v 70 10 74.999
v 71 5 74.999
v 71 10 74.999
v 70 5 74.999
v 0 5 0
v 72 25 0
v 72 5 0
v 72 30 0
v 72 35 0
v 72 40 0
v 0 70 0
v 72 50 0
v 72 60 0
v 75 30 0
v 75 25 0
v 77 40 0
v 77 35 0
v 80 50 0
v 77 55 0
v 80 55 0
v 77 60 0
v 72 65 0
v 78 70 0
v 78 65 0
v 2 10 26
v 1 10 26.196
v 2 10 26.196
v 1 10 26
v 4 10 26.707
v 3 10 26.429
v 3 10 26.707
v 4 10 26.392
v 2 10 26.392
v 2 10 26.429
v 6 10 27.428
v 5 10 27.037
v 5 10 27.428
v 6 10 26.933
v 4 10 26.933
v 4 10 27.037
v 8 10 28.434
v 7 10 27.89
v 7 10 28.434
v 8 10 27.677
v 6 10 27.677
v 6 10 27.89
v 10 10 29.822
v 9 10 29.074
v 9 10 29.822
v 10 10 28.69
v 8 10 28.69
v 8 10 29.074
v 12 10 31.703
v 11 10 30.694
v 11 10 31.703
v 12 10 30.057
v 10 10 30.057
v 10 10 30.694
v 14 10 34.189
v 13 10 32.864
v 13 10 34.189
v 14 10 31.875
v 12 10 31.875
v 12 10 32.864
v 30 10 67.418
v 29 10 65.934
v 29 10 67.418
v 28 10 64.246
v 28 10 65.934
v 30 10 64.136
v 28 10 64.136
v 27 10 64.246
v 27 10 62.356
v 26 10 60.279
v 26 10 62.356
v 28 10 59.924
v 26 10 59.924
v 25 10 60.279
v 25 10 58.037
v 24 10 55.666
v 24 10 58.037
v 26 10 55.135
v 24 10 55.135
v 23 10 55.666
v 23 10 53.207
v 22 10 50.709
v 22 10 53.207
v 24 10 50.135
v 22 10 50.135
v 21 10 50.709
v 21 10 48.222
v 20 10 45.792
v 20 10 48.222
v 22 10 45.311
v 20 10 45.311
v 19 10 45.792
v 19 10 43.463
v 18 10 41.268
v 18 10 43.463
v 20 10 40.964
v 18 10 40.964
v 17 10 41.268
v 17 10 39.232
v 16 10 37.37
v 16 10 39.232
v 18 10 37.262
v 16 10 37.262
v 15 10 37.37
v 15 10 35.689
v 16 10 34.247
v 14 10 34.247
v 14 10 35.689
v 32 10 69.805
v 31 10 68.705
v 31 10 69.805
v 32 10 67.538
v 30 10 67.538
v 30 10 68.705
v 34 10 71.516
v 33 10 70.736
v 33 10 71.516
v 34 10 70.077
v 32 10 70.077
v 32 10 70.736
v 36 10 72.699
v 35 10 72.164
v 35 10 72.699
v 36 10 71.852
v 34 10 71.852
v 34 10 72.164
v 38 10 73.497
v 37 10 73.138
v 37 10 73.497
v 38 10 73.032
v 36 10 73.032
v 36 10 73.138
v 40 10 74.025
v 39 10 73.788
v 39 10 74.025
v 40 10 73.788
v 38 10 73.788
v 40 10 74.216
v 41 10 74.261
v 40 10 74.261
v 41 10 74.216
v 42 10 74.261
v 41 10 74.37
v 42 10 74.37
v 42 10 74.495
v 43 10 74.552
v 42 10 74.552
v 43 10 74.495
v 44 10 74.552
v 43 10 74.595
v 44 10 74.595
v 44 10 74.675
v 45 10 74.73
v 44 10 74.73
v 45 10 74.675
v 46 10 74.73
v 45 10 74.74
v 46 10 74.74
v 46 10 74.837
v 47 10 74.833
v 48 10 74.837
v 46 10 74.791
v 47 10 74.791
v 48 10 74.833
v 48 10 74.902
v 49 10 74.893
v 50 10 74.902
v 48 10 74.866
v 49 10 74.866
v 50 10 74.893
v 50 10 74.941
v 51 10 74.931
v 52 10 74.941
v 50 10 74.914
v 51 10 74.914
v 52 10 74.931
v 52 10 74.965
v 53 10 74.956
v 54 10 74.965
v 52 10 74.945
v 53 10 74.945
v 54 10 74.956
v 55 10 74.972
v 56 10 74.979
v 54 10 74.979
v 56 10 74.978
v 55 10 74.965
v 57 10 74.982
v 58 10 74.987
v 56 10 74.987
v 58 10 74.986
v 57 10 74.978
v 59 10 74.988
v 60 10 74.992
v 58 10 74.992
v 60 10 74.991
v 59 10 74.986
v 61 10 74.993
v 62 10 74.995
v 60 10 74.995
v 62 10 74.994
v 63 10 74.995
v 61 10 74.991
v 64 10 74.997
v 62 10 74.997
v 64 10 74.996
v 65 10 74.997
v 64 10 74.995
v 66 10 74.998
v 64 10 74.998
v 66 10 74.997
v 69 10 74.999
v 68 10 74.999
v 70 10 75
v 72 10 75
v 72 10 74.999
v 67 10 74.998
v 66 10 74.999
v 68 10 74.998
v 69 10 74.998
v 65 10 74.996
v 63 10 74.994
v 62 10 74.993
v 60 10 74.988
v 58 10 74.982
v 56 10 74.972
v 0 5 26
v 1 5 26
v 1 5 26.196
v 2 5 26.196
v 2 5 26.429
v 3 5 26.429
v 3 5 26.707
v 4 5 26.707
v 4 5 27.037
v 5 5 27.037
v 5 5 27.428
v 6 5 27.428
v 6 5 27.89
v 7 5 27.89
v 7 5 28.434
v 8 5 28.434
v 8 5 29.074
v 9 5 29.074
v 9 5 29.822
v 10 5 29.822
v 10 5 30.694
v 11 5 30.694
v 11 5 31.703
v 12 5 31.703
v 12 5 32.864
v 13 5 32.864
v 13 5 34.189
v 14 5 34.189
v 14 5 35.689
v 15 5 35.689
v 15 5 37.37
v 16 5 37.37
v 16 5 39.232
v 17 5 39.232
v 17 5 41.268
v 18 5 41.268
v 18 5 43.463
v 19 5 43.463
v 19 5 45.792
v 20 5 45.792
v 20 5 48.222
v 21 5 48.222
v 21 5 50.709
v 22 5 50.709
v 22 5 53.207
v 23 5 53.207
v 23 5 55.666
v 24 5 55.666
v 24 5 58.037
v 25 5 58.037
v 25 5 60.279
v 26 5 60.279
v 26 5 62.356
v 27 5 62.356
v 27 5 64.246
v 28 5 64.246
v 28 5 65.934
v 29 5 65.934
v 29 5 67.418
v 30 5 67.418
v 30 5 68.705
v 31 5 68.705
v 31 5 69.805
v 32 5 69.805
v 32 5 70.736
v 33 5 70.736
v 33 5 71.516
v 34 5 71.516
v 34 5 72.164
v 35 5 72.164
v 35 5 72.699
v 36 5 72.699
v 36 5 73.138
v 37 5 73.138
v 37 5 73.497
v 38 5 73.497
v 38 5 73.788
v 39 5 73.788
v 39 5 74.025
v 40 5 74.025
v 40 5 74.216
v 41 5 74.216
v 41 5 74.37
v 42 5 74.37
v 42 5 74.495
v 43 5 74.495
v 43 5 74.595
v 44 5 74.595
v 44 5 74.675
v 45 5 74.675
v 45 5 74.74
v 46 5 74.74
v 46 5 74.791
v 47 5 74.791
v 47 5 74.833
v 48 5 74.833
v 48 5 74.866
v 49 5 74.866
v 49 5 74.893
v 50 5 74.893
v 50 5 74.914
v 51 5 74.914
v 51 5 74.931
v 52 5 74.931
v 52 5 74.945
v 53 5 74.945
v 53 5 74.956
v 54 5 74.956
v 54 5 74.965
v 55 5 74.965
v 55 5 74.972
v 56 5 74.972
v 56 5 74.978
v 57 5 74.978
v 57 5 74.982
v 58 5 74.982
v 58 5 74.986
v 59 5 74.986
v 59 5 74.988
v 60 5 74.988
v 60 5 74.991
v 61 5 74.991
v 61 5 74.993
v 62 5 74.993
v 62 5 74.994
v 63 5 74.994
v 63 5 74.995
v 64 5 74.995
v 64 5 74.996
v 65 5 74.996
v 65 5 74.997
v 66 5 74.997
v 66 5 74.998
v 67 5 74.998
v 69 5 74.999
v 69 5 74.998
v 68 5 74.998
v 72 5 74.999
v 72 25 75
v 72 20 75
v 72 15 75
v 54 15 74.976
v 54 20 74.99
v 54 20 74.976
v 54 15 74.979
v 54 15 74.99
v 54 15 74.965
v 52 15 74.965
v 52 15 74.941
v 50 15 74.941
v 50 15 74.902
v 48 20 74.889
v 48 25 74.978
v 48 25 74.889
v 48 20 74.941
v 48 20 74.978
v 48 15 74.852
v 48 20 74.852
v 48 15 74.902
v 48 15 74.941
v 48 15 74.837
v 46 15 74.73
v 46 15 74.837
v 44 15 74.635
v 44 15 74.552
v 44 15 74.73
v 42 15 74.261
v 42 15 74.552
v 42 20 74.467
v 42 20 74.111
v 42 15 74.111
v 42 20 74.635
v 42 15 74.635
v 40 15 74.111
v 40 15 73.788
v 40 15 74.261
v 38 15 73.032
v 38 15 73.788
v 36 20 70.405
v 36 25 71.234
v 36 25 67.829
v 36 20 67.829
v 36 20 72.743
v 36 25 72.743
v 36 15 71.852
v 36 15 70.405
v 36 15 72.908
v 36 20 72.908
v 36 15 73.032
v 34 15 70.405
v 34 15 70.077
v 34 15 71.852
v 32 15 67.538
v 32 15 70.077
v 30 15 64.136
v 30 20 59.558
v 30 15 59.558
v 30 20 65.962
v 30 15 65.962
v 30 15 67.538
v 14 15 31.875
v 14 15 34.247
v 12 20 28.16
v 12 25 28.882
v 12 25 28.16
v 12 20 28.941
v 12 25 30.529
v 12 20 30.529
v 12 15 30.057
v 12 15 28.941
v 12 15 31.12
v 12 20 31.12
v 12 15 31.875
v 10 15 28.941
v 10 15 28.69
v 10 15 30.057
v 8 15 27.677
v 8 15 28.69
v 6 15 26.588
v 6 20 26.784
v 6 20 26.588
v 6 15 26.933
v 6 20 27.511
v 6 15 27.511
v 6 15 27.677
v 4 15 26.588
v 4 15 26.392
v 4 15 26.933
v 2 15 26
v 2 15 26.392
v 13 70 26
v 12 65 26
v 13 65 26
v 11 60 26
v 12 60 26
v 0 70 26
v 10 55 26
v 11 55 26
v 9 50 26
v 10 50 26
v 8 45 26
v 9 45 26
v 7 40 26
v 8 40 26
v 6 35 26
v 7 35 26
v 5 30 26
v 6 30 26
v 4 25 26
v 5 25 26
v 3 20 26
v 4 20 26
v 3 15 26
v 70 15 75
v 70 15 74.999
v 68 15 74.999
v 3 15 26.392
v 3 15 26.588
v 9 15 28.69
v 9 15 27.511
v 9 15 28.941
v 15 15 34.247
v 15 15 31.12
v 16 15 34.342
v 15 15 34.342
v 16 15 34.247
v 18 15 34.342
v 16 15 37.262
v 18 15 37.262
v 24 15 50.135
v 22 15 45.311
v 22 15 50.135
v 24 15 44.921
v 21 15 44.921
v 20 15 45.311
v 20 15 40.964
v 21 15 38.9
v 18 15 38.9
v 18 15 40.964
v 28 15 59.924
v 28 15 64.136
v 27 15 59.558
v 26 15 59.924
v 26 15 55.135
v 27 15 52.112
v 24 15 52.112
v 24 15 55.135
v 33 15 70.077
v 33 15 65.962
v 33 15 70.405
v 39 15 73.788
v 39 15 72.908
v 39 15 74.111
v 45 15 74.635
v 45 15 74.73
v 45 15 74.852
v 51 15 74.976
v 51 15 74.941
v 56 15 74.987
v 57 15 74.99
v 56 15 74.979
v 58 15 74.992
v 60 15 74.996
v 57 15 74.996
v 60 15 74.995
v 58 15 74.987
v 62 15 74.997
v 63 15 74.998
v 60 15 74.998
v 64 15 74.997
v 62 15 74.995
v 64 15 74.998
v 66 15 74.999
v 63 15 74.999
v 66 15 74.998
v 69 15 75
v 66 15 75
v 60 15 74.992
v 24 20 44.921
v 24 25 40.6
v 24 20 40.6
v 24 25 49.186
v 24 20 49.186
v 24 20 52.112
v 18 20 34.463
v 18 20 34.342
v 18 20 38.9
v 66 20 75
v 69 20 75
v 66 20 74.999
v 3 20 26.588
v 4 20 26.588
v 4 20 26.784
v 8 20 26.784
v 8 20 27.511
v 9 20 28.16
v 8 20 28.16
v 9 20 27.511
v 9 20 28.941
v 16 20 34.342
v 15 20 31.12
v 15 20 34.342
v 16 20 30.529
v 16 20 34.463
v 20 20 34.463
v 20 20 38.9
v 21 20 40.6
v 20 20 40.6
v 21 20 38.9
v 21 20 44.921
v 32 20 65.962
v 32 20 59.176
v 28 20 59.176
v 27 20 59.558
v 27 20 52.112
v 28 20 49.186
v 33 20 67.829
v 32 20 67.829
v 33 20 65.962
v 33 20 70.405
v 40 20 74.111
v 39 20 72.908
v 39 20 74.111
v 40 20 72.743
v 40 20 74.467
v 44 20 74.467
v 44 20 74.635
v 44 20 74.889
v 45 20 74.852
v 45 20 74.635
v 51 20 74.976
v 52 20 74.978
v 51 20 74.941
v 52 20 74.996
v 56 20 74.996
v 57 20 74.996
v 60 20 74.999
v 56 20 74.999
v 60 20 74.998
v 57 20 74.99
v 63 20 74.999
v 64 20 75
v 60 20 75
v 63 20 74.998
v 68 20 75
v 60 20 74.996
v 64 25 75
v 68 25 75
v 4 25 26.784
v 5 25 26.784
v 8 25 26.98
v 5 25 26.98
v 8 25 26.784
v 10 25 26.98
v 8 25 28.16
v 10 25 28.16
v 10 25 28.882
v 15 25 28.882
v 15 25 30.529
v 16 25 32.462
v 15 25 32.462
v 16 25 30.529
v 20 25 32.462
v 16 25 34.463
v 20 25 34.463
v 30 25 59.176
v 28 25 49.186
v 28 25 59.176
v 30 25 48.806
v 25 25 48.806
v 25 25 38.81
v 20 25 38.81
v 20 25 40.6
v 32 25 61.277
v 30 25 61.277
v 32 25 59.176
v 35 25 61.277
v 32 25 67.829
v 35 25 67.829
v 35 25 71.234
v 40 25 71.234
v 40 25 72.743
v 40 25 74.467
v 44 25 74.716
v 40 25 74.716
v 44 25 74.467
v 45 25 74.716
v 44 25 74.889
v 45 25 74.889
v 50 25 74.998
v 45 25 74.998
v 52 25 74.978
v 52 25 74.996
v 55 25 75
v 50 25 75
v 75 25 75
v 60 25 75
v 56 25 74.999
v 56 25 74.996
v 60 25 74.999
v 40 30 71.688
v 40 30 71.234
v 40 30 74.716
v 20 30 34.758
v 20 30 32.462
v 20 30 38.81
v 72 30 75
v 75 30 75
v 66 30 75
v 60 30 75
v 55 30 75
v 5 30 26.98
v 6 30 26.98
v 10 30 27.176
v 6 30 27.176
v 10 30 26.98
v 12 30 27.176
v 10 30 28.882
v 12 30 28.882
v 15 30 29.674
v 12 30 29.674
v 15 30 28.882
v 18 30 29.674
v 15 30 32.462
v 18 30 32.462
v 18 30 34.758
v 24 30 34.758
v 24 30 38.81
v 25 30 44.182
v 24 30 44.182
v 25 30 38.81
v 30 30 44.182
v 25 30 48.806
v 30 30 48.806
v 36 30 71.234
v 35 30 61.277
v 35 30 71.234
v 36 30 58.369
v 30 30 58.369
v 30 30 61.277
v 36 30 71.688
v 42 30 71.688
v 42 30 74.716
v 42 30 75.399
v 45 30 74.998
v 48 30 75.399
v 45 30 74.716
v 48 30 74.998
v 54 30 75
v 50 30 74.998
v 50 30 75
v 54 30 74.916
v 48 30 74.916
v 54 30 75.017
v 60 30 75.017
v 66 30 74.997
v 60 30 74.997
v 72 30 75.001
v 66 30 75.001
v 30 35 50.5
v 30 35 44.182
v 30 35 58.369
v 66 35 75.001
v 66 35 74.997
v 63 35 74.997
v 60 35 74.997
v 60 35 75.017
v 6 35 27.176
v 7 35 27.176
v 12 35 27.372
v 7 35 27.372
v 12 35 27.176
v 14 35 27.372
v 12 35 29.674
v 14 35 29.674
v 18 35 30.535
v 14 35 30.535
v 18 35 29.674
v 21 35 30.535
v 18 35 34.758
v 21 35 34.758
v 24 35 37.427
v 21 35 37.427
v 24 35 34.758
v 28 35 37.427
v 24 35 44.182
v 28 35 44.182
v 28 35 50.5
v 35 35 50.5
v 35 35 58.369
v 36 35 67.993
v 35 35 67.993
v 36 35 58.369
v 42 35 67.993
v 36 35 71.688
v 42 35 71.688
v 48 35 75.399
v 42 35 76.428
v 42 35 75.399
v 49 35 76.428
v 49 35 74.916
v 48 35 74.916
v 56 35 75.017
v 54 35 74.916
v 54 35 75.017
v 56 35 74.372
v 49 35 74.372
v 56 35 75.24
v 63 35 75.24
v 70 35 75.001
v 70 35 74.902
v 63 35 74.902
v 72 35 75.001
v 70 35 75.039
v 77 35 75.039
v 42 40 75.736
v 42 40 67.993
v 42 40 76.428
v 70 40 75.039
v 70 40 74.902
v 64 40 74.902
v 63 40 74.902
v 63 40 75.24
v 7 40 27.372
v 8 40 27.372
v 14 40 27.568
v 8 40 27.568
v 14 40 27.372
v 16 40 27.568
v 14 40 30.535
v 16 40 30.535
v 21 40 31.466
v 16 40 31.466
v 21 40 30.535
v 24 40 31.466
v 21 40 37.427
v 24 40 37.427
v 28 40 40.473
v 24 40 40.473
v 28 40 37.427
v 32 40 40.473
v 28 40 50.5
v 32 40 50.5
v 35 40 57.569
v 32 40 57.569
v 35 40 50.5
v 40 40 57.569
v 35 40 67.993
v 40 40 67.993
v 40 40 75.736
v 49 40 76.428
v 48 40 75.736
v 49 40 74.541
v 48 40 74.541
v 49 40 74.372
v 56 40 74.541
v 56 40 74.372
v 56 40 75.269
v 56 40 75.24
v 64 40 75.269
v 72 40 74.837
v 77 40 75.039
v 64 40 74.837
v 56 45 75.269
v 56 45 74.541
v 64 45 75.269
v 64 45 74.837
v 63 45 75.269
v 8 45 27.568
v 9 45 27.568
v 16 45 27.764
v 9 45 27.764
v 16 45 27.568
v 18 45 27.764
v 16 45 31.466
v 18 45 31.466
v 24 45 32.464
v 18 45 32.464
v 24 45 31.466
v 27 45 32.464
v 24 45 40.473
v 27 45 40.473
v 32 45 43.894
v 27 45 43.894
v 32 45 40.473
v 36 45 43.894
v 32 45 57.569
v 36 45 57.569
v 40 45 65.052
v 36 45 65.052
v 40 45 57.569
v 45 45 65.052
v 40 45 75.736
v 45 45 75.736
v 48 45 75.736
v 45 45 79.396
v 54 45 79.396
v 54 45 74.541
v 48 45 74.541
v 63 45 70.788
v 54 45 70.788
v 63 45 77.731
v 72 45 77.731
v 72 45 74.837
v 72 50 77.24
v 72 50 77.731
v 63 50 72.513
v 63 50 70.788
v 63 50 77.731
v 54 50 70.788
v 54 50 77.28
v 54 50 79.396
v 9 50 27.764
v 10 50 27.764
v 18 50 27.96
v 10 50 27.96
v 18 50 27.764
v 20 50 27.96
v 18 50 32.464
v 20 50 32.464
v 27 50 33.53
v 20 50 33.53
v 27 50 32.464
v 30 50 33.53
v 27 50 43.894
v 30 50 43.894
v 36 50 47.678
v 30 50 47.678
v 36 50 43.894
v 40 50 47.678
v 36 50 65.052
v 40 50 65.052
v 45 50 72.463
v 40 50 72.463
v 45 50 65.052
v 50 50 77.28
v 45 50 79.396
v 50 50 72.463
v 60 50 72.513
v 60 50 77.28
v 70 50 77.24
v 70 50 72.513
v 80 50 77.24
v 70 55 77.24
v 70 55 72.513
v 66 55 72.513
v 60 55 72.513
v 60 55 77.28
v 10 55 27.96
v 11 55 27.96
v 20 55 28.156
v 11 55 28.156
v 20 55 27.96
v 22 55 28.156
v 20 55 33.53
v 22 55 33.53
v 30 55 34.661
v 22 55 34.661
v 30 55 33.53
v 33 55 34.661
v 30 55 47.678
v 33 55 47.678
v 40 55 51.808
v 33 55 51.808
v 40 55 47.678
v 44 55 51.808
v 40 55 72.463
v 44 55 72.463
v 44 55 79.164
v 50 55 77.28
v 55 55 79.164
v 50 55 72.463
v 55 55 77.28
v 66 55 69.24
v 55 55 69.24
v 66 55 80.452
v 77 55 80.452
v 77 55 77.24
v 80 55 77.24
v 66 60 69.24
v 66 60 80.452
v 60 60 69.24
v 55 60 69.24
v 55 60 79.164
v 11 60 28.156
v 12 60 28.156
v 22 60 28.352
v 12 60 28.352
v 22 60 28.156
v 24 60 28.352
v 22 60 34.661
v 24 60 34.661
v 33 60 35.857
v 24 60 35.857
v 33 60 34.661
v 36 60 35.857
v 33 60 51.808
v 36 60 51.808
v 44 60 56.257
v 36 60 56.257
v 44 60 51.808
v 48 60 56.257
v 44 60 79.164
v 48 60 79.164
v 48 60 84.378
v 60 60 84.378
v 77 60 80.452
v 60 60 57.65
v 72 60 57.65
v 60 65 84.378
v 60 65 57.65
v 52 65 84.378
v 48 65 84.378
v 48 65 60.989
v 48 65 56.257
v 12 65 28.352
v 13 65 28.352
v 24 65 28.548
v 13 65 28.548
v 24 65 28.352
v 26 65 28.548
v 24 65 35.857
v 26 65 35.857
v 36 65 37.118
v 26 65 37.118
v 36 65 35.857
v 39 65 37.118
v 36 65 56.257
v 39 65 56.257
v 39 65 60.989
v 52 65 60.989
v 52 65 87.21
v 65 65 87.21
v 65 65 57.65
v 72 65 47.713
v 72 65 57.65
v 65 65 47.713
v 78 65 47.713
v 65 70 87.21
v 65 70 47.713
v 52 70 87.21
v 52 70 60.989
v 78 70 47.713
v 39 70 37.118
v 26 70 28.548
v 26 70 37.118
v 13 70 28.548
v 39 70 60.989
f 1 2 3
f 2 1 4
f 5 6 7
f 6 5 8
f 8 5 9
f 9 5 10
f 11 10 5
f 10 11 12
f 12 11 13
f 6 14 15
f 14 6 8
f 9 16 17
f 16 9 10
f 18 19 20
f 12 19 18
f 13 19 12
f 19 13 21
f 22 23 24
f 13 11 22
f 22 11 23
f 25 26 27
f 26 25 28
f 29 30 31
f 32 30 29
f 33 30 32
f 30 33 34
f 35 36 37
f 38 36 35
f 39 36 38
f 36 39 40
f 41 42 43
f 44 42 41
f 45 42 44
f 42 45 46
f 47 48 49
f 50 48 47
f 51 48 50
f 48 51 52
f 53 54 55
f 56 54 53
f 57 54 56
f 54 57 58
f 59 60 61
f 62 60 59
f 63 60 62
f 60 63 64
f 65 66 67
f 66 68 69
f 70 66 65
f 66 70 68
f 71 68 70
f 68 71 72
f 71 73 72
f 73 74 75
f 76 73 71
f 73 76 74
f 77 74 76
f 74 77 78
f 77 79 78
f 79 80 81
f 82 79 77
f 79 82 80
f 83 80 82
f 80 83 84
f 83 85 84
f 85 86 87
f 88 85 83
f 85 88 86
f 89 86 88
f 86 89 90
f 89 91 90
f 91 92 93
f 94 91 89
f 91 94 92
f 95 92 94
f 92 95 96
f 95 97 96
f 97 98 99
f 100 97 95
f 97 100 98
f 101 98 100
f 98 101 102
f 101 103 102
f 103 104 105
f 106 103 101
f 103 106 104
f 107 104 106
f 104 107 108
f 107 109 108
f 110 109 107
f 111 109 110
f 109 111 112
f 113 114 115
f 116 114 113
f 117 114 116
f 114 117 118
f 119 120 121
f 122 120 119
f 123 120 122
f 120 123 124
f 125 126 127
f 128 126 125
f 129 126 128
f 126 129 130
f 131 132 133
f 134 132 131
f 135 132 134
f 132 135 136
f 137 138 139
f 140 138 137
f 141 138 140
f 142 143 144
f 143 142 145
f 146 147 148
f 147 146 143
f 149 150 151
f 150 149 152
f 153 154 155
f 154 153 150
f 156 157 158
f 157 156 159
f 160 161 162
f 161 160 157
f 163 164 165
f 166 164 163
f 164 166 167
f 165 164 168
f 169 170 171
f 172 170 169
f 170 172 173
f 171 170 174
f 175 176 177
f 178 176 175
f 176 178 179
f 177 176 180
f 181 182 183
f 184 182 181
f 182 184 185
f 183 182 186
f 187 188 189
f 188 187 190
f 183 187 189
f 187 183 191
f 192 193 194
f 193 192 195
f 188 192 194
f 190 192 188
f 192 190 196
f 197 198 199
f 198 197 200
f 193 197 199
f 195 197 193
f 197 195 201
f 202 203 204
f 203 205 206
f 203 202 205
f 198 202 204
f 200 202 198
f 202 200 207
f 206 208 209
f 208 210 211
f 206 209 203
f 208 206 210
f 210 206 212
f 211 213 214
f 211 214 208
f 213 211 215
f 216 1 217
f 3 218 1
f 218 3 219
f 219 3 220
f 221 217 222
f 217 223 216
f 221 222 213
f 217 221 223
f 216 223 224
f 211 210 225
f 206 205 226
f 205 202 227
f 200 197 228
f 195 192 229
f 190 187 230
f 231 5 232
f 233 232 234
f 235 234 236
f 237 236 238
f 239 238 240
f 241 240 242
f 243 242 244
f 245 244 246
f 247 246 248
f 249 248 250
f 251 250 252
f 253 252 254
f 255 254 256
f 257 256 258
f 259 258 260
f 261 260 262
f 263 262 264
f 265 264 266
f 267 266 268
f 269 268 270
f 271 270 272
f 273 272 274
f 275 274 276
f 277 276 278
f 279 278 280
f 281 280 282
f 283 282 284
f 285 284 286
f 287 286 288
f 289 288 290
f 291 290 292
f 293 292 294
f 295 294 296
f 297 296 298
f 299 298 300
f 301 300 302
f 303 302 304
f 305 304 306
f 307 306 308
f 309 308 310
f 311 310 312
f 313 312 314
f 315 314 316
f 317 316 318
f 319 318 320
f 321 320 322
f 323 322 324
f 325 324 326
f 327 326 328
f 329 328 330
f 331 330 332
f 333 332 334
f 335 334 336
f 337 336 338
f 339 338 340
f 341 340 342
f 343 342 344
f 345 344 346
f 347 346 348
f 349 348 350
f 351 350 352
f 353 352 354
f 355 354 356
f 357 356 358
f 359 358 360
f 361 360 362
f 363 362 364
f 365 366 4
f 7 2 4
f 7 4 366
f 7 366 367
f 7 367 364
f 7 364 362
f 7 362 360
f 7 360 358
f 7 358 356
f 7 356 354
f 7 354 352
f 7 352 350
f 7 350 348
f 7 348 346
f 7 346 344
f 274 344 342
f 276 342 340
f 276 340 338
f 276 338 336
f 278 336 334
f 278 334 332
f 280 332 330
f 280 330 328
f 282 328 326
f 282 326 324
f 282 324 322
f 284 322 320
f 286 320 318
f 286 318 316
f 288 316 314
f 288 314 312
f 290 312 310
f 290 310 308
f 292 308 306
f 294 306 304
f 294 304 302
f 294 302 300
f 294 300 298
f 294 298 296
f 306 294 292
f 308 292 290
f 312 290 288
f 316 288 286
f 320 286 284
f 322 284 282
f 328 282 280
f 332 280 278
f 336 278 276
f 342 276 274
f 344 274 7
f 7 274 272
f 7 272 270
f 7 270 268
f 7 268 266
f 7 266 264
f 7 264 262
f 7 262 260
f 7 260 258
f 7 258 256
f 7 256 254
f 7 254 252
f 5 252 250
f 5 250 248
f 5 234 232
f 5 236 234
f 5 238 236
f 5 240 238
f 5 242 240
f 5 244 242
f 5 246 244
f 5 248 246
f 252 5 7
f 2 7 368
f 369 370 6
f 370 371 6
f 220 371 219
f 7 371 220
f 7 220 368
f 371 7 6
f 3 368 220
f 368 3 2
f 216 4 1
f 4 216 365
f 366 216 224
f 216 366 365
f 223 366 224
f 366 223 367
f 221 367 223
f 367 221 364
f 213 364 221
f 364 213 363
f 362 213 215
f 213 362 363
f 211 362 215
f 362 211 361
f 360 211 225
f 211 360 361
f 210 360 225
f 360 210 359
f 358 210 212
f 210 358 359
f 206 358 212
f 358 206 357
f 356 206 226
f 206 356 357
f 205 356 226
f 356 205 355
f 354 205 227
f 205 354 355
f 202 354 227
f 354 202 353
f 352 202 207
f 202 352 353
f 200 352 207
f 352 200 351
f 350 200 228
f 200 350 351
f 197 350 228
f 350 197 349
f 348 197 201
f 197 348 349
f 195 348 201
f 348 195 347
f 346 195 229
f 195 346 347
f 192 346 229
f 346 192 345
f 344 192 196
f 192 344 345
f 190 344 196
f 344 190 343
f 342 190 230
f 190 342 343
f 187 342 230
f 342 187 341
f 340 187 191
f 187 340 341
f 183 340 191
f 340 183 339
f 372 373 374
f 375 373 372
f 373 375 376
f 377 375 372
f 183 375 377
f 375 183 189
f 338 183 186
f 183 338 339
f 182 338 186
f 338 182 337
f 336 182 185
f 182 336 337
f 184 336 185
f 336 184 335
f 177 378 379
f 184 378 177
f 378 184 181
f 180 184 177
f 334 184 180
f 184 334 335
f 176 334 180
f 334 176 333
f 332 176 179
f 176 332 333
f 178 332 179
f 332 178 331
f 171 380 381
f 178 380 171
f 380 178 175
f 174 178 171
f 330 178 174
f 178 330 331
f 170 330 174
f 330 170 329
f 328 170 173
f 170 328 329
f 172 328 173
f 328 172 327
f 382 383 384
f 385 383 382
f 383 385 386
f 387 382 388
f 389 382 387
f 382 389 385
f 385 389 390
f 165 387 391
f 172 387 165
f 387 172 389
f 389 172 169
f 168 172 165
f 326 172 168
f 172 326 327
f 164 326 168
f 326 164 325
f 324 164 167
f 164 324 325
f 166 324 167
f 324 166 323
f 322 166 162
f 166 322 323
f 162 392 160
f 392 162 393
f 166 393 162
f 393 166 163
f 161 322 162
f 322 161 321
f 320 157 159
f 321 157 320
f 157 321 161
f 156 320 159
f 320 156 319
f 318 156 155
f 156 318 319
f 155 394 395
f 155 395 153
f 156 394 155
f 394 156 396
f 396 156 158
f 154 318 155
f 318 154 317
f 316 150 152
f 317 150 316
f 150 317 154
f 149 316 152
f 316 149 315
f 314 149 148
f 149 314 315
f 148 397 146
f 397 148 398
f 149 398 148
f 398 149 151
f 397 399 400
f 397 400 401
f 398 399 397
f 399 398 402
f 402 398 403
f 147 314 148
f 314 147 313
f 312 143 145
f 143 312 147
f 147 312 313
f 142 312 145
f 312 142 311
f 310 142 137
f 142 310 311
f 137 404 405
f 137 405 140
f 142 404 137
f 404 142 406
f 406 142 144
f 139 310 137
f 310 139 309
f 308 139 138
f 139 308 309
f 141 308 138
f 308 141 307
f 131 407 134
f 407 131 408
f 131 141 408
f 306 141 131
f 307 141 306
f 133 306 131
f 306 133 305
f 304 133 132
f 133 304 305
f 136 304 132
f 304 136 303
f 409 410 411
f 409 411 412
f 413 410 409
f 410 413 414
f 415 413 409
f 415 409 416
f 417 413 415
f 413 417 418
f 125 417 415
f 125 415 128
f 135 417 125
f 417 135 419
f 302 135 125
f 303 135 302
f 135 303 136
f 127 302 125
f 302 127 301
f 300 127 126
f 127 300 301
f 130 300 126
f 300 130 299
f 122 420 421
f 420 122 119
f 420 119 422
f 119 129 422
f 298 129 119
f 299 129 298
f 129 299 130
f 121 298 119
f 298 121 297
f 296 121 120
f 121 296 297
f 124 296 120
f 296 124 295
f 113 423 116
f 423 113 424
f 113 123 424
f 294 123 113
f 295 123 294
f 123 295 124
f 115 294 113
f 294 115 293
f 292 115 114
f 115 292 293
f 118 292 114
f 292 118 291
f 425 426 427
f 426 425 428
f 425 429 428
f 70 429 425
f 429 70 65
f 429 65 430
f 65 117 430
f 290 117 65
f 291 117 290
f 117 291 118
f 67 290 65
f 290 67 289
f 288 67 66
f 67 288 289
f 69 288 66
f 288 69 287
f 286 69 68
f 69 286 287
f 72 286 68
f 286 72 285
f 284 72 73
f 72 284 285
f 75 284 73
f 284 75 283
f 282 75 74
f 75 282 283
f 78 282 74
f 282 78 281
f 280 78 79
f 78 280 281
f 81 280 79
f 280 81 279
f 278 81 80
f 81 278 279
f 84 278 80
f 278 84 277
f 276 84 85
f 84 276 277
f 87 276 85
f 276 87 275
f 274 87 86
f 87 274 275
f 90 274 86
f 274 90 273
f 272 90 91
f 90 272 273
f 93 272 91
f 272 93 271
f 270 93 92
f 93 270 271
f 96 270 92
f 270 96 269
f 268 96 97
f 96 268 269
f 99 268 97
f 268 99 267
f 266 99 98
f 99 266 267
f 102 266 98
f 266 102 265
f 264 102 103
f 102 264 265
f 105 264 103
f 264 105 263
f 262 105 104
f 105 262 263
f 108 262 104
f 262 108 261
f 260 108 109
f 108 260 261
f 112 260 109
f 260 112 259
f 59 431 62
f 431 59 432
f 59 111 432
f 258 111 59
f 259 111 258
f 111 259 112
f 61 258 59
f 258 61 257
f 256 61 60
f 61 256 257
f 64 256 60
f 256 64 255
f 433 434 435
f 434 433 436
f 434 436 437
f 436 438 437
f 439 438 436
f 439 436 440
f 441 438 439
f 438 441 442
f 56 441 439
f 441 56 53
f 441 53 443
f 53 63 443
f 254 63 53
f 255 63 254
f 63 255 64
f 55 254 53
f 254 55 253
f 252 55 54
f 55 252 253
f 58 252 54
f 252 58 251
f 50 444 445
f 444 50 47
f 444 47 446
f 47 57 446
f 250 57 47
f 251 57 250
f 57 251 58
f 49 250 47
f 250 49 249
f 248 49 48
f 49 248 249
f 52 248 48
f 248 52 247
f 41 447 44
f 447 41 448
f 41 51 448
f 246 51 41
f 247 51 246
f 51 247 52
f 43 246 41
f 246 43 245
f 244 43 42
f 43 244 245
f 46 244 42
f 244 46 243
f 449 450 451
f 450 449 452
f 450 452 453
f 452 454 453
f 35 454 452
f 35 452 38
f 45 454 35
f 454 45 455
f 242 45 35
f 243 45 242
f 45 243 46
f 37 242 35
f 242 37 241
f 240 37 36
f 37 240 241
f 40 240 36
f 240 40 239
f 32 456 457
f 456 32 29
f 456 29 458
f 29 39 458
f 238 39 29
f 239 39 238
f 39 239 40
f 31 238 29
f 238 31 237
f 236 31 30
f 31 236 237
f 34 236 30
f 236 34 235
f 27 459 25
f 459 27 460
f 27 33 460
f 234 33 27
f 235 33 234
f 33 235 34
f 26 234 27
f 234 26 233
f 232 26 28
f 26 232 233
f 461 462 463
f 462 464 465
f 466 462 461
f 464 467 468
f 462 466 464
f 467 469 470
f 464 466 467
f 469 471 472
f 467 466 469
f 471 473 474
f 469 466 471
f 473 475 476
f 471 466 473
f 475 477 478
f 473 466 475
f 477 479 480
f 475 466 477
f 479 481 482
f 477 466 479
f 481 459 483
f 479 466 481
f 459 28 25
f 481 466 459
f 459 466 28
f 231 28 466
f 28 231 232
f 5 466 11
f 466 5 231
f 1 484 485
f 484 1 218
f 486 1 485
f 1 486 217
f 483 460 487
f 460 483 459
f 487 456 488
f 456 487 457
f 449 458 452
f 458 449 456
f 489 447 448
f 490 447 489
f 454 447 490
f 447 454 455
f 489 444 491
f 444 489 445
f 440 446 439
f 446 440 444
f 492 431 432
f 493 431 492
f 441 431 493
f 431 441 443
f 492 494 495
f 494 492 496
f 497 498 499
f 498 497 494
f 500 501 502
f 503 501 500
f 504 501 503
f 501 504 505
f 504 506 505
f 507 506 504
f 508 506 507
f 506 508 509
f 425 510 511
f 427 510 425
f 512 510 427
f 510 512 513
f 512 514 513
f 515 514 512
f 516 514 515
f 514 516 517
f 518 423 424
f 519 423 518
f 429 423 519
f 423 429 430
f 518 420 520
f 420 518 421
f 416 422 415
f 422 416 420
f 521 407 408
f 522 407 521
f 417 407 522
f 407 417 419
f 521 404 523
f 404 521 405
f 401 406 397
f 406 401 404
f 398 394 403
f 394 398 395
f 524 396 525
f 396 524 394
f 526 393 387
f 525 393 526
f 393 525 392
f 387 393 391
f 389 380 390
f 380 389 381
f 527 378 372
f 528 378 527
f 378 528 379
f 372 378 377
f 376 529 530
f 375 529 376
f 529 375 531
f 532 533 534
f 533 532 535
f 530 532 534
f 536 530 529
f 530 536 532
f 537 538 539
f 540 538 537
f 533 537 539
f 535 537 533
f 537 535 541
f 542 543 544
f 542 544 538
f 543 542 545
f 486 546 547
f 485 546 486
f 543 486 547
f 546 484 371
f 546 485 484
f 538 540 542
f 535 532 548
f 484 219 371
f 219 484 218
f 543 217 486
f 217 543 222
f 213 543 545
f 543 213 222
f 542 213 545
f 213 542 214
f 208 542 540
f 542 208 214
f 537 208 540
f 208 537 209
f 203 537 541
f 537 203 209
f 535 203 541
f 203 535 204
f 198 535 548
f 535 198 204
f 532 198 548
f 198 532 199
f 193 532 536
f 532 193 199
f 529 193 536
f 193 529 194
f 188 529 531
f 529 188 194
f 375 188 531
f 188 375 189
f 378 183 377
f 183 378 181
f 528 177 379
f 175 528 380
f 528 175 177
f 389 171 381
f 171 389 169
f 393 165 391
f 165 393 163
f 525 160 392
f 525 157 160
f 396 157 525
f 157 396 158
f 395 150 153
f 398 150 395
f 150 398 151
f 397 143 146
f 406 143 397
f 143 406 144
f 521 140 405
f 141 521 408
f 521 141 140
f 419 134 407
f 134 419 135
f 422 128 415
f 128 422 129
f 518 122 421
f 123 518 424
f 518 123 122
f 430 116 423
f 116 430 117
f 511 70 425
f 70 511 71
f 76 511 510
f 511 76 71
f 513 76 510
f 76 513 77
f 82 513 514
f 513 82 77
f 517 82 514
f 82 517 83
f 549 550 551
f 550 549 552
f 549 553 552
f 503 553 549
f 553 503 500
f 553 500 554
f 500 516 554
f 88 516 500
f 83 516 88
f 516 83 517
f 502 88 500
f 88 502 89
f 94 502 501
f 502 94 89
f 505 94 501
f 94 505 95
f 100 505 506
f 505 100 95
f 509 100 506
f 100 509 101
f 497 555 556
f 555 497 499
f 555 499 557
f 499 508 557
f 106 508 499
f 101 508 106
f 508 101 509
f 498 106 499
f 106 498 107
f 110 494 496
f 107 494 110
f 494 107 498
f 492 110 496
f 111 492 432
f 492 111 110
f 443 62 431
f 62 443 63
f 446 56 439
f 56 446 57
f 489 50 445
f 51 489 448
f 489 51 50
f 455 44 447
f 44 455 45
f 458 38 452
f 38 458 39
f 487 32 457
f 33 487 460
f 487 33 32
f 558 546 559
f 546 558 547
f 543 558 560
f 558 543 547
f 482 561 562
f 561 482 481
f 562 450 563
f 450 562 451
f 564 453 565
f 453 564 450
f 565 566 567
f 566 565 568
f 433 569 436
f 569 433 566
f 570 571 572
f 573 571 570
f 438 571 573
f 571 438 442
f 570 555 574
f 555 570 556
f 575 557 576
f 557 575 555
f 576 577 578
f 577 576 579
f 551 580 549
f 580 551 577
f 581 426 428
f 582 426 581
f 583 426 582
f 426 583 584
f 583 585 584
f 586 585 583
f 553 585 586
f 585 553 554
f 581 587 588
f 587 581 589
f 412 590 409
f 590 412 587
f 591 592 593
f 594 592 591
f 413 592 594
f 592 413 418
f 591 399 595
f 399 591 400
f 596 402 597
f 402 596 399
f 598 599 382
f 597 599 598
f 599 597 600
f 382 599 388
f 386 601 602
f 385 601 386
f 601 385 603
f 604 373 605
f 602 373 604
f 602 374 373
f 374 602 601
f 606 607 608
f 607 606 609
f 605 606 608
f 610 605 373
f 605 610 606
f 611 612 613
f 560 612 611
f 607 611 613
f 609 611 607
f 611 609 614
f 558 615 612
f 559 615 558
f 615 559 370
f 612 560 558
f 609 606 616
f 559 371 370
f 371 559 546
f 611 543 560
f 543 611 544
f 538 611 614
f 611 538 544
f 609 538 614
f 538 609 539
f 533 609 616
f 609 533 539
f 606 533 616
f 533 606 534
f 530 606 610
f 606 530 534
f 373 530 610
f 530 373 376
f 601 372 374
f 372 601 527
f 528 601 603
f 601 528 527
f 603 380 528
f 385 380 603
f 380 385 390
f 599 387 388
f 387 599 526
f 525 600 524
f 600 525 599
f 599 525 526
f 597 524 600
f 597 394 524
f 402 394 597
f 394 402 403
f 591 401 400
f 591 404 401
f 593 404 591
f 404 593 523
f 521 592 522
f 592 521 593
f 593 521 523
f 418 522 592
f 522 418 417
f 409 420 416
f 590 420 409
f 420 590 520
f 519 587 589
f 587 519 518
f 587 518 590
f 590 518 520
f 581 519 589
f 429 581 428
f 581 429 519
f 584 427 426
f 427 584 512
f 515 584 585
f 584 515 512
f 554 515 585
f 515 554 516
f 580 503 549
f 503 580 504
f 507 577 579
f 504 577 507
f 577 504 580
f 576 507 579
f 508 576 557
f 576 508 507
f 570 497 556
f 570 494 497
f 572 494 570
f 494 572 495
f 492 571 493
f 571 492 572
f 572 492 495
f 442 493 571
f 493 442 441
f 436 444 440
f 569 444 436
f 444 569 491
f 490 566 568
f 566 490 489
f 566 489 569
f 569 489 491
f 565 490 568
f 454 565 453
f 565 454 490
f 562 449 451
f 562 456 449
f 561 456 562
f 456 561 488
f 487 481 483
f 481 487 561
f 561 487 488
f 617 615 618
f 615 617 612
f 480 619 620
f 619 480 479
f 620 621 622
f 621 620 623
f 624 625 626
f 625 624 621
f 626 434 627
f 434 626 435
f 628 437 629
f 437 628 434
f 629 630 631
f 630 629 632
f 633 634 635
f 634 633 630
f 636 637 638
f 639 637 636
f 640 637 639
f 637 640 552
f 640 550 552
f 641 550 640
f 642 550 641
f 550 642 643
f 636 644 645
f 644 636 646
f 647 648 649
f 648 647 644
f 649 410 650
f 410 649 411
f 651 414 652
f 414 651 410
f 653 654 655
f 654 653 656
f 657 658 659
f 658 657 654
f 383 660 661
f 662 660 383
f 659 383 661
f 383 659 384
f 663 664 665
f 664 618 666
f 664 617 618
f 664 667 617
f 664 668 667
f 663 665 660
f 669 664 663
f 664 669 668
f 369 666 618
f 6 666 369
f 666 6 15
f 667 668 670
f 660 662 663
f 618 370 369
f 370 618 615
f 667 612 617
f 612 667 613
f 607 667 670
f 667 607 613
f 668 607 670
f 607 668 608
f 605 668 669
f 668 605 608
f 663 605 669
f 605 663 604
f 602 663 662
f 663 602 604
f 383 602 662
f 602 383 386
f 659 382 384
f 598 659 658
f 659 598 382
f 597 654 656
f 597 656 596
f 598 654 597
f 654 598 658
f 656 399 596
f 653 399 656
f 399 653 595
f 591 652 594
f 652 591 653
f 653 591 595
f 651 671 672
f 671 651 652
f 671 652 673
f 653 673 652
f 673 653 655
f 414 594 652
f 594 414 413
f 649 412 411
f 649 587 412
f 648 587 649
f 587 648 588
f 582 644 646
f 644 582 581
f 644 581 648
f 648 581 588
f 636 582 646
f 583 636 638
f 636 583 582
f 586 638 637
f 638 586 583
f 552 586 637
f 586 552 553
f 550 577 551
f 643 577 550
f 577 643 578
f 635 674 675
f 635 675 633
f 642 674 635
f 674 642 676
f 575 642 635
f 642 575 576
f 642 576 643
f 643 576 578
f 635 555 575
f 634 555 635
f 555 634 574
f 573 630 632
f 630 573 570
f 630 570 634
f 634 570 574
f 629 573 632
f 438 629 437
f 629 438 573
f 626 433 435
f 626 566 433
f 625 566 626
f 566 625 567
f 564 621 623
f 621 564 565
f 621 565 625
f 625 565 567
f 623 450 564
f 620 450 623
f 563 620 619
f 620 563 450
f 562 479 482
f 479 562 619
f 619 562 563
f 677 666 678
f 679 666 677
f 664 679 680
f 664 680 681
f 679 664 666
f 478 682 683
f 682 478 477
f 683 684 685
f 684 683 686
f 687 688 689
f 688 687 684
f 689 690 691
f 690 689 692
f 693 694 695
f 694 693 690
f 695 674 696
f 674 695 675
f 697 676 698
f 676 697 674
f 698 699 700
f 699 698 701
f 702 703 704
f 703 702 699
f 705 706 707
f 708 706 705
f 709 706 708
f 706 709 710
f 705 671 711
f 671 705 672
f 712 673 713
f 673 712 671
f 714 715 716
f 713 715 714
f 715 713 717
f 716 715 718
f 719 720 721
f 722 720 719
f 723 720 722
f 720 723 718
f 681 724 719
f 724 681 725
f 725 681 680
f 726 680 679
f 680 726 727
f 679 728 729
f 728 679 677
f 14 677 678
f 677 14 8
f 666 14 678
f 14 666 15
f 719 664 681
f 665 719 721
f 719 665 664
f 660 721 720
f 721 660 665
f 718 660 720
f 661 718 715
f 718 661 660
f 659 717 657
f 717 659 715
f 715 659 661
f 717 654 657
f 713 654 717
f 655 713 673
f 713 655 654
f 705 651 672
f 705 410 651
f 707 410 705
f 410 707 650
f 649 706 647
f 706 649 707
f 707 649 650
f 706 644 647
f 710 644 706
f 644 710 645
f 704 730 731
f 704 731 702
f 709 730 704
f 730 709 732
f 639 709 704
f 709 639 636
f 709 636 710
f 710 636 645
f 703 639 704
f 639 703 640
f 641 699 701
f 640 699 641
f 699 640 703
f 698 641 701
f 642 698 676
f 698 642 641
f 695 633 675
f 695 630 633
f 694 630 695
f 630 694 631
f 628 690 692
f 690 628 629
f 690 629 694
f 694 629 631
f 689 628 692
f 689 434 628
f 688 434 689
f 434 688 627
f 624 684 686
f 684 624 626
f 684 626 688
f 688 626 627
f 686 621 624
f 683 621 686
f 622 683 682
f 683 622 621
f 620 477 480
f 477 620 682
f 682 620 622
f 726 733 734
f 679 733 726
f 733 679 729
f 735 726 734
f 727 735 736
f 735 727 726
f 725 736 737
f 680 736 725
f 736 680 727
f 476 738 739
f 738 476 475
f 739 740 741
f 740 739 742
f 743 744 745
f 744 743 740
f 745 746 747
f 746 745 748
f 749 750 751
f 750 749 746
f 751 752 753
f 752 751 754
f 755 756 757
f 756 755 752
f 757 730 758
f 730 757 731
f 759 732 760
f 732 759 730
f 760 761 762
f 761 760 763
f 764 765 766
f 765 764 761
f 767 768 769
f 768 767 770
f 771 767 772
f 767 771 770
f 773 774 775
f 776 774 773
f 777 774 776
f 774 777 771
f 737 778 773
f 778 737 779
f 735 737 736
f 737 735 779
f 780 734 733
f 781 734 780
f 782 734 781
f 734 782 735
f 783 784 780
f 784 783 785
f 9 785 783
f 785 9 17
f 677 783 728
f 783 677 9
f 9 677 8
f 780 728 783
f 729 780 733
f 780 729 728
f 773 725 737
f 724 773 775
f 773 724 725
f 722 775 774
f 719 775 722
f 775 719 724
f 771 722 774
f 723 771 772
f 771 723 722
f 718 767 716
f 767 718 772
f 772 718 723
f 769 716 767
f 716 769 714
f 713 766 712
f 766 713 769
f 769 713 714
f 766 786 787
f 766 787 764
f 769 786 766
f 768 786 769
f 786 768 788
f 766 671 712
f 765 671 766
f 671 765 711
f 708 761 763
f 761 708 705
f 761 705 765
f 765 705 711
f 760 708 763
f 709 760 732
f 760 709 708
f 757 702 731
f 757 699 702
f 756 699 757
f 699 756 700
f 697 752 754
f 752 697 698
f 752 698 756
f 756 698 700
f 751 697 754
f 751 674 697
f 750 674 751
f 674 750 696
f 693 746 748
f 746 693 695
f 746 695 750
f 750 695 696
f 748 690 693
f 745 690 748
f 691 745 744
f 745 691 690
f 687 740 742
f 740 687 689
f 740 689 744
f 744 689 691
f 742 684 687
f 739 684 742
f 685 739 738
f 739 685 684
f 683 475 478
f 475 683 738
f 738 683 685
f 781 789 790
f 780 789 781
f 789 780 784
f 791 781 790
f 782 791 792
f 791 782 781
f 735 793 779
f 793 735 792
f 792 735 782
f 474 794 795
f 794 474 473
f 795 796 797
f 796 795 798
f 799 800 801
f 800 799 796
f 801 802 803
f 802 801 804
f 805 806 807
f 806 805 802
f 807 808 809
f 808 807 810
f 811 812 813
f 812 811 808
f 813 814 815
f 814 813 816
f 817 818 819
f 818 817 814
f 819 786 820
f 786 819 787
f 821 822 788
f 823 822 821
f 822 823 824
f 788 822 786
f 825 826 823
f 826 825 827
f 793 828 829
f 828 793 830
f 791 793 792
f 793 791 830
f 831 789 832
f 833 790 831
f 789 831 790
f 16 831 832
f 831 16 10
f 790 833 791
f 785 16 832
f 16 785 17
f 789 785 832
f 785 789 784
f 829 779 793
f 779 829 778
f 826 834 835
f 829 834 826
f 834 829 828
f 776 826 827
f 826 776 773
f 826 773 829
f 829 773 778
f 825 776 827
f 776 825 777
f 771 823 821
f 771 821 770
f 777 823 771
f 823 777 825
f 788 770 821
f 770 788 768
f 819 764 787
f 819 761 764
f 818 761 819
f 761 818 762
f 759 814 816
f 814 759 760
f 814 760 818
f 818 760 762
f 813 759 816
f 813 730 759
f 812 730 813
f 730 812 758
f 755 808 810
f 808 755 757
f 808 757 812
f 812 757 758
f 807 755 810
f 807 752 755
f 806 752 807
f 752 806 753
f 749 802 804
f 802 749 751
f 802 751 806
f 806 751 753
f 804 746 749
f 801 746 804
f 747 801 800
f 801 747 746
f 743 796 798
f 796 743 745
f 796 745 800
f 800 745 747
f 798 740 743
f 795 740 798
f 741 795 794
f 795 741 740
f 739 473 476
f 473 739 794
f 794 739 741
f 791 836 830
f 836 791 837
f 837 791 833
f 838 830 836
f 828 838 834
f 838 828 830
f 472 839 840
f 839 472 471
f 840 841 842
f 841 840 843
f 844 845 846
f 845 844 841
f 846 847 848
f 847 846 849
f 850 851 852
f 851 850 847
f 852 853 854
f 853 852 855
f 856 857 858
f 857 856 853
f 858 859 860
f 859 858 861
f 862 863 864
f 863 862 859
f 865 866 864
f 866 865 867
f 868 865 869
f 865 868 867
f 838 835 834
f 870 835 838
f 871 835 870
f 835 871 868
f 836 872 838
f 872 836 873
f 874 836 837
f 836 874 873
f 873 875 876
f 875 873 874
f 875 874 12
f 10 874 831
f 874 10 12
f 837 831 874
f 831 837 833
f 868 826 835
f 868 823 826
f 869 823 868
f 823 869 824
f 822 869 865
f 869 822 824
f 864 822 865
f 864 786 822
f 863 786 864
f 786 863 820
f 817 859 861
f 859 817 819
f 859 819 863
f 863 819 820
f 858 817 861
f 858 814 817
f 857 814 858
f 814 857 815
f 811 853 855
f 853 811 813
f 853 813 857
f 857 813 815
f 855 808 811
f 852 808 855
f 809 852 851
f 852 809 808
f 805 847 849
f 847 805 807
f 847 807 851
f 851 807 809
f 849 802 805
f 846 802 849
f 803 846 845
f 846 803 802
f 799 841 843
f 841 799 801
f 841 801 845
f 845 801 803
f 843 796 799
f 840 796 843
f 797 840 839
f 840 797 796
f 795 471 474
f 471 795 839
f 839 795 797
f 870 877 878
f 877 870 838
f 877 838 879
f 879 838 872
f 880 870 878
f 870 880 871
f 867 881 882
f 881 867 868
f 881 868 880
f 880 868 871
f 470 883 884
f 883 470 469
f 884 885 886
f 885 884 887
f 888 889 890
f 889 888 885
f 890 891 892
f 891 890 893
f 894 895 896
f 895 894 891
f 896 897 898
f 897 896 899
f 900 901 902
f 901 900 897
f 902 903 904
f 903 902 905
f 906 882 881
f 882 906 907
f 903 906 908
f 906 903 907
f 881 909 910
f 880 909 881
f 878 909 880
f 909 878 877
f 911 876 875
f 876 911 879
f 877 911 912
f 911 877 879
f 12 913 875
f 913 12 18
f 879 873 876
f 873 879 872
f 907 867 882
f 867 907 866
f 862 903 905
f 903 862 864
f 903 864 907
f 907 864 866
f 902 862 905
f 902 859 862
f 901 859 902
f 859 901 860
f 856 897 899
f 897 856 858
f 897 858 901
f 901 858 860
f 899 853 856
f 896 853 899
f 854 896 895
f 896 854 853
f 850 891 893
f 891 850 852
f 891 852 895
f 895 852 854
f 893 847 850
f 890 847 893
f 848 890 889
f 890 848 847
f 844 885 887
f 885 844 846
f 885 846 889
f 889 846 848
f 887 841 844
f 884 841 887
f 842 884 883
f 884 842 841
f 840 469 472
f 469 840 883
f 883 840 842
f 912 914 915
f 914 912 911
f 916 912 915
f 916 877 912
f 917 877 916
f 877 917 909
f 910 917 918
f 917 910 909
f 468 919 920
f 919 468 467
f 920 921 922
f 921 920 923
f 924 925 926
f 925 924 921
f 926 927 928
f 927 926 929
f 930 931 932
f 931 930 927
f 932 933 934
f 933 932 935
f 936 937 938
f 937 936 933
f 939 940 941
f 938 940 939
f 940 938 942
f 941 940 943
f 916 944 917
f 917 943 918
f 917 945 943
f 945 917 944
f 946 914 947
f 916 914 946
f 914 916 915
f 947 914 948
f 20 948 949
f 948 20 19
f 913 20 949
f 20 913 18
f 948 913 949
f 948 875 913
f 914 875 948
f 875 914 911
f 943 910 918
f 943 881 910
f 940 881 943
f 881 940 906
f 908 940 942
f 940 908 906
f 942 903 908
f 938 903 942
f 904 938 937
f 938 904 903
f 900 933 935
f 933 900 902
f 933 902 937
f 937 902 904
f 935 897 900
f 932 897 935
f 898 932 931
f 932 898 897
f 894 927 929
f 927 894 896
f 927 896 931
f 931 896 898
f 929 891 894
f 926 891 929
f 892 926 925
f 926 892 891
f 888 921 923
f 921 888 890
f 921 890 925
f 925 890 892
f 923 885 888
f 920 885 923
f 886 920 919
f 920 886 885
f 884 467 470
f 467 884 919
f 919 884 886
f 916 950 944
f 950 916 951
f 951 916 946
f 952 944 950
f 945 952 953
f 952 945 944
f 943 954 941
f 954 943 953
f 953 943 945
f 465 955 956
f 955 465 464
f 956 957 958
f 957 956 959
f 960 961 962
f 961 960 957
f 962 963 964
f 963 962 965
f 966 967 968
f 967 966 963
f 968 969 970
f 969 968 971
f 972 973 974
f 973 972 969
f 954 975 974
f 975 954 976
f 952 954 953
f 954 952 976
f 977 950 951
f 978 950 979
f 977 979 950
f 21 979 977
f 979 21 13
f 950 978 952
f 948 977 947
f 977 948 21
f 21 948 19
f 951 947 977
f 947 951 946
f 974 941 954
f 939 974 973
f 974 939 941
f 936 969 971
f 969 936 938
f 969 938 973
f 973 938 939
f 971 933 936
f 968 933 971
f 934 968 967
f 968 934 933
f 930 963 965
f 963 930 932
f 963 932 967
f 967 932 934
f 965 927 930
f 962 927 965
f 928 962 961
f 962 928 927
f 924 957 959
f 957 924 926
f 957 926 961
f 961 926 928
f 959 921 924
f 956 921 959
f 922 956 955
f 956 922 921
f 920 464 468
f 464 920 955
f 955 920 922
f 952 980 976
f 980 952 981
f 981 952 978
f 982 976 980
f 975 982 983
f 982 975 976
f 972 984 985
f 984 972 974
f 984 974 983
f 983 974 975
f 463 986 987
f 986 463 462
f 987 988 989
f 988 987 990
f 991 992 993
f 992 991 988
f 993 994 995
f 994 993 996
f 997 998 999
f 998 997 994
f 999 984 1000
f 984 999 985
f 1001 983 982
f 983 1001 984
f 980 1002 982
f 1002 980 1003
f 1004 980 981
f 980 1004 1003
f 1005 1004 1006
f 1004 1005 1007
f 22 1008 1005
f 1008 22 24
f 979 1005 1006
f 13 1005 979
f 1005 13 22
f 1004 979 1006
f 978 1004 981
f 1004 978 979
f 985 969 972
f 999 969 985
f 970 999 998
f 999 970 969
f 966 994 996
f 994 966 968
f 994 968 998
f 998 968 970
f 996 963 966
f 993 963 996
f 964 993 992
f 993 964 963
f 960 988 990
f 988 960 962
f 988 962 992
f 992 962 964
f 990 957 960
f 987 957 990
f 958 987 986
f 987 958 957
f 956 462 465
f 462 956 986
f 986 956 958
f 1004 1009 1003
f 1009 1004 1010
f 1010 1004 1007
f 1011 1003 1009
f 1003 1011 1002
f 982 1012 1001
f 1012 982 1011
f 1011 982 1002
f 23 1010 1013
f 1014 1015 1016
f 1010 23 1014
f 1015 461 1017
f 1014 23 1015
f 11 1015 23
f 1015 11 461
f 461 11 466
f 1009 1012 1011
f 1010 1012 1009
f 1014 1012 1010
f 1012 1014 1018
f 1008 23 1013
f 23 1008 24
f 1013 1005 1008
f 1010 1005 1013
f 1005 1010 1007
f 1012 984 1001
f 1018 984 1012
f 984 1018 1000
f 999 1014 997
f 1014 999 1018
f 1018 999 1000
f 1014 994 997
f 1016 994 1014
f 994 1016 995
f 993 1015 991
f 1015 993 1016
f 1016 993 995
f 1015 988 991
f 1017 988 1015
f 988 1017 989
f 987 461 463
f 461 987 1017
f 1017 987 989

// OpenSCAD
// File stepSizeLogistic.scad
// demonstrates numerical error produced by various step sizes
// using logistics function
// (c) 2019-2022 Rich Cameron, for the book Make:Calculus
// Licensed under a Creative Commons, Attribution,
// CC-BY 4.0 international license, per
// https://creativecommons.org/licenses/by/4.0/
// Attribute to Rich Cameron, at
// repository github.com/whosawhatsis/Calculus

a = 0.2; //exponential decay factor 
w = 5; //width in y direction of each iteration
offset = 25; // height in millimeters for f(x,step) = 0
K = 50; //carrying capacity 
 
// h = step in x direction - varied as a parameter
// f(x) is assumed to be the logistics function 
// And assumed to start at f(0) = 1. 

for(i = [1:13]) translate([0, i * w, 0]) f(h = i);

module f(i = 0,  h, start = 1, end = 2 * 3 * 4 * 3) {
	cube([h, w, start + offset]);
	if (i < (end - h) )
        translate([h, 0, 0]) 
       f( i + h, h, start * (1 + h * a) - h * a * pow(start, 2) / K, end);
}
